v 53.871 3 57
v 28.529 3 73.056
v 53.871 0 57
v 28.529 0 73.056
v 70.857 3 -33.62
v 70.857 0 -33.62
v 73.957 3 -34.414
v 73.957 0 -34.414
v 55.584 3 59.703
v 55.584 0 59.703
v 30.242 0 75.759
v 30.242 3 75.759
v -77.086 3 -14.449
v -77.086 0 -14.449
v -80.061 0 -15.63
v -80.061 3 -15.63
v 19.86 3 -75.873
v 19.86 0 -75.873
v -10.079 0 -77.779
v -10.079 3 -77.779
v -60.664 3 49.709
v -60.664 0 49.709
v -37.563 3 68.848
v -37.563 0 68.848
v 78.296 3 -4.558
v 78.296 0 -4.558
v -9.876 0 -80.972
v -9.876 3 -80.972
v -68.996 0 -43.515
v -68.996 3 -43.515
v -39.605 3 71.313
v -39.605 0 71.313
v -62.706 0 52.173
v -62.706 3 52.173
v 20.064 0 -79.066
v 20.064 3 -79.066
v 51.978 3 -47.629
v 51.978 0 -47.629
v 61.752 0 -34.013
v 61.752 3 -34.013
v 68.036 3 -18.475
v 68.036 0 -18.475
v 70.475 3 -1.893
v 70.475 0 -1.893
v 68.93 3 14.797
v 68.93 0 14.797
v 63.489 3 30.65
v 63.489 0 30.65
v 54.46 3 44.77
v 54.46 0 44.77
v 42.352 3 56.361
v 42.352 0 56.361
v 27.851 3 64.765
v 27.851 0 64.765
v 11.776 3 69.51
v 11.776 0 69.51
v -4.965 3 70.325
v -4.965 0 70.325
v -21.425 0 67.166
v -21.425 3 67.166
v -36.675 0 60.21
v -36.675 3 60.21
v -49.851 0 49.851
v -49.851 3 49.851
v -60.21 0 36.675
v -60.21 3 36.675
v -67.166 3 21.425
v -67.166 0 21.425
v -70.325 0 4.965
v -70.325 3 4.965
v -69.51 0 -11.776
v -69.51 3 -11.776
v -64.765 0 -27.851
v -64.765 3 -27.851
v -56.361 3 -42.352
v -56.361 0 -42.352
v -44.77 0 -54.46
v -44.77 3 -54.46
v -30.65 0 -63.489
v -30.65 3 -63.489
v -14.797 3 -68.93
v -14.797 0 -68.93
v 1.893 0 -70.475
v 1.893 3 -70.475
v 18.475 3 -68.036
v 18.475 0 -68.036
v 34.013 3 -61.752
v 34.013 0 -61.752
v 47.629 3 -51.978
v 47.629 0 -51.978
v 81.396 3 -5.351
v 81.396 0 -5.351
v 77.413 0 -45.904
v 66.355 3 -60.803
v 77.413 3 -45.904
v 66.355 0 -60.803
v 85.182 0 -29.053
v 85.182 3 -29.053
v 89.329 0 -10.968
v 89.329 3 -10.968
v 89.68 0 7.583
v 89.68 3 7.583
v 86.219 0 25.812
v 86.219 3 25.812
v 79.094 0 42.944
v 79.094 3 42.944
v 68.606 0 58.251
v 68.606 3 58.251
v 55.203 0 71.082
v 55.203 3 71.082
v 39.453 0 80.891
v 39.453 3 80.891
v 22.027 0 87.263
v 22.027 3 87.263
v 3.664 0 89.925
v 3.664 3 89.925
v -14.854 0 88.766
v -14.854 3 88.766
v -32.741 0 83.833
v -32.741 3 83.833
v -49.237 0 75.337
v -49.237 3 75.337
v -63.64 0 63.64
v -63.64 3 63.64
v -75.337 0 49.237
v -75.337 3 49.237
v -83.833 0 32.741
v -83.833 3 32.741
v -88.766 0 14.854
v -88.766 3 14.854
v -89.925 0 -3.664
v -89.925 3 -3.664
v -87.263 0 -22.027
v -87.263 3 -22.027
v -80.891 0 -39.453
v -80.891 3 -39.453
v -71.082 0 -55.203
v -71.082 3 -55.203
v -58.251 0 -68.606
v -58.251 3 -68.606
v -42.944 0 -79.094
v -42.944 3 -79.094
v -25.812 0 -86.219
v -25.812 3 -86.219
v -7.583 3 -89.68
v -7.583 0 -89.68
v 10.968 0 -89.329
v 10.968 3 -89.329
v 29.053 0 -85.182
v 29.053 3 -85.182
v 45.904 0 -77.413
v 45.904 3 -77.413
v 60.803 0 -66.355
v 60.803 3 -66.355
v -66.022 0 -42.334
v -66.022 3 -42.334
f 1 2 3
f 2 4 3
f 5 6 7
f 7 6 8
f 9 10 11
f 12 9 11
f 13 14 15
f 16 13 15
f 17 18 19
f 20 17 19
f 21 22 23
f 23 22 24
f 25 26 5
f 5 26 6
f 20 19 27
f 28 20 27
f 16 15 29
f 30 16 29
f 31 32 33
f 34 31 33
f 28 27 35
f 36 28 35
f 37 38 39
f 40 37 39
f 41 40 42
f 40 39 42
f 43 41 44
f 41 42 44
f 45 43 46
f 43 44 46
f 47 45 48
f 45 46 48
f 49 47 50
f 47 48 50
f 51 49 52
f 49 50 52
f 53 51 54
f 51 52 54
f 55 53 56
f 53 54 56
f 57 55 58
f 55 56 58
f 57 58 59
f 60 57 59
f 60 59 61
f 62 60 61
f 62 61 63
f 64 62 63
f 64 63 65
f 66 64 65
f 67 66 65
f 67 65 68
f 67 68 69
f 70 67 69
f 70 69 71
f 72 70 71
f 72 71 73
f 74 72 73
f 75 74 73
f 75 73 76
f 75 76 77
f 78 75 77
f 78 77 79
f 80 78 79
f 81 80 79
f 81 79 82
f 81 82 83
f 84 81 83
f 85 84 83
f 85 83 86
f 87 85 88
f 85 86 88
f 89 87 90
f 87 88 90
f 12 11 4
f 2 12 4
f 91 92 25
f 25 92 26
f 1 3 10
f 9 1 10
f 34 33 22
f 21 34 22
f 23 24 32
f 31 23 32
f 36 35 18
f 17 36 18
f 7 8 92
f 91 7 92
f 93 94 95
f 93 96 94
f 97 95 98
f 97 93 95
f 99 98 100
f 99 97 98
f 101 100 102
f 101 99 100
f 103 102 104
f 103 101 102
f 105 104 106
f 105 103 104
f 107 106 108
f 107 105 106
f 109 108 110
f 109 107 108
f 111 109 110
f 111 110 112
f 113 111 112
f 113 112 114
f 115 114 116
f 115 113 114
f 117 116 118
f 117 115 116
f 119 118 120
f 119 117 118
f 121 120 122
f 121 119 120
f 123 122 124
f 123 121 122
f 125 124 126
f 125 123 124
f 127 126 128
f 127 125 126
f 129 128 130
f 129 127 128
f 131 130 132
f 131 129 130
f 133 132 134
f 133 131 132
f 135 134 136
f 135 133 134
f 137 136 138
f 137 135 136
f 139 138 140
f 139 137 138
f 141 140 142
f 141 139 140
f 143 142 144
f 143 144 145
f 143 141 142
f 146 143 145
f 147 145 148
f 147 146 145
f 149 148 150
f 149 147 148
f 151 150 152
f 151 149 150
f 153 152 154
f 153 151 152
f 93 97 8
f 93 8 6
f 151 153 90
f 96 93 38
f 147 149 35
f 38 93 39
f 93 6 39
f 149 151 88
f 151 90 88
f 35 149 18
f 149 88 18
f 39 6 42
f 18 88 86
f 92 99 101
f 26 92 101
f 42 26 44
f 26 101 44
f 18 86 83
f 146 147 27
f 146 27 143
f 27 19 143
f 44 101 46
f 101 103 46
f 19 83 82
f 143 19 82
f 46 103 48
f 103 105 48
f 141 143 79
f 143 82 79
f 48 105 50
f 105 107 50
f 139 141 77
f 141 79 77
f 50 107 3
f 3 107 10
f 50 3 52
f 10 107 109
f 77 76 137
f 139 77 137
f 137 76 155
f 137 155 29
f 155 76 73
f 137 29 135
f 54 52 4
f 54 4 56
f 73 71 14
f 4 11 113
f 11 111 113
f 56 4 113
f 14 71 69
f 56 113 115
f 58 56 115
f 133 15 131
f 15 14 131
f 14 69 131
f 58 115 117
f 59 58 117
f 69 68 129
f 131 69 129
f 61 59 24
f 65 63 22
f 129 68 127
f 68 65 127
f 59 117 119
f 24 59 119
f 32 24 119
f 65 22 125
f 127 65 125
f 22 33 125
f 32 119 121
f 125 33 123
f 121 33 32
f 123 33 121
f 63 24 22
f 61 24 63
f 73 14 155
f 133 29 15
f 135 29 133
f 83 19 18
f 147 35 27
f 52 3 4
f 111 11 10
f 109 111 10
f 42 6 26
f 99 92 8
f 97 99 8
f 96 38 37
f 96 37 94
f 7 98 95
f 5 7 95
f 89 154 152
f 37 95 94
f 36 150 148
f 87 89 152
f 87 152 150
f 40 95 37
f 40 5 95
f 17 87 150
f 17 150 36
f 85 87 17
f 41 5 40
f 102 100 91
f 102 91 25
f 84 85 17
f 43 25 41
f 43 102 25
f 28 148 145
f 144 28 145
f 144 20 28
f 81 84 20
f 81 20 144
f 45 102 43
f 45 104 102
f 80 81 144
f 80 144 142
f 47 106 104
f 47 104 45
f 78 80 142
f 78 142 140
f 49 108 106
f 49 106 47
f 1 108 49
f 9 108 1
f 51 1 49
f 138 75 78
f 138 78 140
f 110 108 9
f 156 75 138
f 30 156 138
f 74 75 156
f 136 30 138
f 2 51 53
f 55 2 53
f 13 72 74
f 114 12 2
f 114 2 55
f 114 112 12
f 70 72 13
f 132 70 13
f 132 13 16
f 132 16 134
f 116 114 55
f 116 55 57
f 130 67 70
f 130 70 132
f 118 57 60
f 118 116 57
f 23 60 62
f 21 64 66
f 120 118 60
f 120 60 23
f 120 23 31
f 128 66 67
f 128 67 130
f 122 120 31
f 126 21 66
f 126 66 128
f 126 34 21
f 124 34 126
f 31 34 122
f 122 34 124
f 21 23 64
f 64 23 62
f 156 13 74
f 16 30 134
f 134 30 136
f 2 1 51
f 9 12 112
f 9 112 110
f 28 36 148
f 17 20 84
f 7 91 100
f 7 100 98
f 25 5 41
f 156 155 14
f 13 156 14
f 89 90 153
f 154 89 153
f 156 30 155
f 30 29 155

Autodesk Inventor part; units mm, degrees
ref_plane "YZ Plane" through (0, 0, 0) normal (1, 0, 0) x (0, 1, 0)
ref_plane "XZ Plane" through (0, 0, 0) normal (0, 1, 0) x (-1, 0, 0)
ref_plane "XY Plane" through (0, 0, 0) normal (0, 0, 1) x (1, 0, 0)
sketch "Sketch1" plane through (0, 0, 0) normal (0, 1, 0) x (-1, 0, 0)
  circle A0 centre (0, 0) radius 70.5
  circle A1 centre (0, 0) radius 90
  line L0 (90, 0) -> (70.5, 0)
  line L1 (-90, 0) -> (-70.5, 0)
  line L2 (0, 0) -> (-70.5, 0) construction
  line L3 (0, 70.5) -> (0, 0) construction
  line L4 (0, 90) -> (0, 70.5)
  line L5 (-70.5, 0) -> (-90, 0)
  line L6 (-74.25, 7) -> (-86.25, 7)
  line L7 (-86.25, 7) -> (-83.7022, 0)
  line L8 (-74.25, 7) -> (-76.7978, 0)
  line L9 (-80.25, 0) -> (-80.25, 7) construction
  line L10 (-55.5838, 59.7031) -> (-30.242, 75.7591)
  line L11 (-30.242, 75.7591) -> (-28.5294, 73.056)
  line L12 (-28.5294, 73.056) -> (-53.8711, 57)
  line L13 (-53.8711, 57) -> (-55.5838, 59.7031)
  line L14 (-55.5838, 59.7031) -> (-28.5294, 73.056) construction
  line L15 (-30.242, 75.7591) -> (-53.8711, 57) construction
  circle A2 centre (0, 0) radius 80 construction
  line L16 (-73.9574, -34.414) -> (-81.3965, -5.351)
  line L17 (-70.8573, -33.6205) -> (-73.9574, -34.414)
  line L18 (-78.2964, -4.5575) -> (-70.8573, -33.6205)
  line L19 (-81.3965, -5.351) -> (-78.2964, -4.5575)
  line L20 (9.8756, -80.9722) -> (-20.0638, -79.0662)
  line L21 (10.0789, -77.7786) -> (9.8756, -80.9722)
  line L22 (-19.8605, -75.8727) -> (10.0789, -77.7786)
  line L23 (-20.0638, -79.0662) -> (-19.8605, -75.8727)
  line L24 (80.0608, -15.6295) -> (68.9964, -43.5146)
  line L25 (77.0864, -14.4493) -> (80.0608, -15.6295)
  line L26 (66.022, -42.3344) -> (77.0864, -14.4493)
  line L27 (68.9964, -43.5146) -> (66.022, -42.3344)
  line L28 (0, 0) -> (-63.6396, -63.6396) construction
  line L29 (0, 0) -> (-60.8031, -66.355)
  line L30 (0, 0) -> (-66.355, -60.8031)
  line L31 (39.6047, 71.3126) -> (62.7059, 52.1727)
  line L32 (37.5631, 68.8485) -> (39.6047, 71.3126)
  line L33 (60.6643, 49.7086) -> (37.5631, 68.8485)
  line L34 (62.7059, 52.1727) -> (60.6643, 49.7086)
  point P0 (80.25, 0)
  point P1 (-80.25, 0)
  point P2 (-42.0566, 66.3795)
  point P3 (-15.2947, 78.5243)
  point P4 (-54.7275, 58.3516)
  point P5 (-29.3857, 74.4075)
  point P6 (-72.4073, -34.0173)
  point P7 (-79.8464, -4.9543)
  point P8 (9.9773, -79.3754)
  point P9 (-19.9621, -77.4694)
  point P10 (78.5736, -15.0394)
  point P11 (67.5092, -42.9245)
  point P12 (-76.7978, 0)
  point P13 (-83.7022, 0)
  point P14 (38.5839, 70.0805)
  point P15 (61.6851, 50.9406)
  point P16 (-51.9781, -47.6291)
  point P17 (-47.6291, -51.9781)
  dimension "d1" = 180
  dimension "d0" = 141
  dimension "d4" = 90
  dimension "d5" = 7
  dimension "d6" = 70
  dimension "d8" = 12
  dimension "d13" = 3.2
  dimension "d14" = 30
  dimension "d15" = 50
  dimension "d20" = 160
  dimension "d27" = 360
  dimension "d29" = 45
  dimension "d32" = 5
  dimension "d33" = 2.5
extrude "Extrusion1" add sketch "Sketch1" along normal blind 3 contours L0 A1 L29 A0 | A0 L4 A1 L0 | A0 L1 L8 L6 L7 A1 L4 | A0 L30 A1 L1 | L1 L7 L6 L8
equation "\"d33\" = 0.5 * d32"
properties part number "D14_CM_CIRCULO" material "MDF Medium Density Fiberboard"
